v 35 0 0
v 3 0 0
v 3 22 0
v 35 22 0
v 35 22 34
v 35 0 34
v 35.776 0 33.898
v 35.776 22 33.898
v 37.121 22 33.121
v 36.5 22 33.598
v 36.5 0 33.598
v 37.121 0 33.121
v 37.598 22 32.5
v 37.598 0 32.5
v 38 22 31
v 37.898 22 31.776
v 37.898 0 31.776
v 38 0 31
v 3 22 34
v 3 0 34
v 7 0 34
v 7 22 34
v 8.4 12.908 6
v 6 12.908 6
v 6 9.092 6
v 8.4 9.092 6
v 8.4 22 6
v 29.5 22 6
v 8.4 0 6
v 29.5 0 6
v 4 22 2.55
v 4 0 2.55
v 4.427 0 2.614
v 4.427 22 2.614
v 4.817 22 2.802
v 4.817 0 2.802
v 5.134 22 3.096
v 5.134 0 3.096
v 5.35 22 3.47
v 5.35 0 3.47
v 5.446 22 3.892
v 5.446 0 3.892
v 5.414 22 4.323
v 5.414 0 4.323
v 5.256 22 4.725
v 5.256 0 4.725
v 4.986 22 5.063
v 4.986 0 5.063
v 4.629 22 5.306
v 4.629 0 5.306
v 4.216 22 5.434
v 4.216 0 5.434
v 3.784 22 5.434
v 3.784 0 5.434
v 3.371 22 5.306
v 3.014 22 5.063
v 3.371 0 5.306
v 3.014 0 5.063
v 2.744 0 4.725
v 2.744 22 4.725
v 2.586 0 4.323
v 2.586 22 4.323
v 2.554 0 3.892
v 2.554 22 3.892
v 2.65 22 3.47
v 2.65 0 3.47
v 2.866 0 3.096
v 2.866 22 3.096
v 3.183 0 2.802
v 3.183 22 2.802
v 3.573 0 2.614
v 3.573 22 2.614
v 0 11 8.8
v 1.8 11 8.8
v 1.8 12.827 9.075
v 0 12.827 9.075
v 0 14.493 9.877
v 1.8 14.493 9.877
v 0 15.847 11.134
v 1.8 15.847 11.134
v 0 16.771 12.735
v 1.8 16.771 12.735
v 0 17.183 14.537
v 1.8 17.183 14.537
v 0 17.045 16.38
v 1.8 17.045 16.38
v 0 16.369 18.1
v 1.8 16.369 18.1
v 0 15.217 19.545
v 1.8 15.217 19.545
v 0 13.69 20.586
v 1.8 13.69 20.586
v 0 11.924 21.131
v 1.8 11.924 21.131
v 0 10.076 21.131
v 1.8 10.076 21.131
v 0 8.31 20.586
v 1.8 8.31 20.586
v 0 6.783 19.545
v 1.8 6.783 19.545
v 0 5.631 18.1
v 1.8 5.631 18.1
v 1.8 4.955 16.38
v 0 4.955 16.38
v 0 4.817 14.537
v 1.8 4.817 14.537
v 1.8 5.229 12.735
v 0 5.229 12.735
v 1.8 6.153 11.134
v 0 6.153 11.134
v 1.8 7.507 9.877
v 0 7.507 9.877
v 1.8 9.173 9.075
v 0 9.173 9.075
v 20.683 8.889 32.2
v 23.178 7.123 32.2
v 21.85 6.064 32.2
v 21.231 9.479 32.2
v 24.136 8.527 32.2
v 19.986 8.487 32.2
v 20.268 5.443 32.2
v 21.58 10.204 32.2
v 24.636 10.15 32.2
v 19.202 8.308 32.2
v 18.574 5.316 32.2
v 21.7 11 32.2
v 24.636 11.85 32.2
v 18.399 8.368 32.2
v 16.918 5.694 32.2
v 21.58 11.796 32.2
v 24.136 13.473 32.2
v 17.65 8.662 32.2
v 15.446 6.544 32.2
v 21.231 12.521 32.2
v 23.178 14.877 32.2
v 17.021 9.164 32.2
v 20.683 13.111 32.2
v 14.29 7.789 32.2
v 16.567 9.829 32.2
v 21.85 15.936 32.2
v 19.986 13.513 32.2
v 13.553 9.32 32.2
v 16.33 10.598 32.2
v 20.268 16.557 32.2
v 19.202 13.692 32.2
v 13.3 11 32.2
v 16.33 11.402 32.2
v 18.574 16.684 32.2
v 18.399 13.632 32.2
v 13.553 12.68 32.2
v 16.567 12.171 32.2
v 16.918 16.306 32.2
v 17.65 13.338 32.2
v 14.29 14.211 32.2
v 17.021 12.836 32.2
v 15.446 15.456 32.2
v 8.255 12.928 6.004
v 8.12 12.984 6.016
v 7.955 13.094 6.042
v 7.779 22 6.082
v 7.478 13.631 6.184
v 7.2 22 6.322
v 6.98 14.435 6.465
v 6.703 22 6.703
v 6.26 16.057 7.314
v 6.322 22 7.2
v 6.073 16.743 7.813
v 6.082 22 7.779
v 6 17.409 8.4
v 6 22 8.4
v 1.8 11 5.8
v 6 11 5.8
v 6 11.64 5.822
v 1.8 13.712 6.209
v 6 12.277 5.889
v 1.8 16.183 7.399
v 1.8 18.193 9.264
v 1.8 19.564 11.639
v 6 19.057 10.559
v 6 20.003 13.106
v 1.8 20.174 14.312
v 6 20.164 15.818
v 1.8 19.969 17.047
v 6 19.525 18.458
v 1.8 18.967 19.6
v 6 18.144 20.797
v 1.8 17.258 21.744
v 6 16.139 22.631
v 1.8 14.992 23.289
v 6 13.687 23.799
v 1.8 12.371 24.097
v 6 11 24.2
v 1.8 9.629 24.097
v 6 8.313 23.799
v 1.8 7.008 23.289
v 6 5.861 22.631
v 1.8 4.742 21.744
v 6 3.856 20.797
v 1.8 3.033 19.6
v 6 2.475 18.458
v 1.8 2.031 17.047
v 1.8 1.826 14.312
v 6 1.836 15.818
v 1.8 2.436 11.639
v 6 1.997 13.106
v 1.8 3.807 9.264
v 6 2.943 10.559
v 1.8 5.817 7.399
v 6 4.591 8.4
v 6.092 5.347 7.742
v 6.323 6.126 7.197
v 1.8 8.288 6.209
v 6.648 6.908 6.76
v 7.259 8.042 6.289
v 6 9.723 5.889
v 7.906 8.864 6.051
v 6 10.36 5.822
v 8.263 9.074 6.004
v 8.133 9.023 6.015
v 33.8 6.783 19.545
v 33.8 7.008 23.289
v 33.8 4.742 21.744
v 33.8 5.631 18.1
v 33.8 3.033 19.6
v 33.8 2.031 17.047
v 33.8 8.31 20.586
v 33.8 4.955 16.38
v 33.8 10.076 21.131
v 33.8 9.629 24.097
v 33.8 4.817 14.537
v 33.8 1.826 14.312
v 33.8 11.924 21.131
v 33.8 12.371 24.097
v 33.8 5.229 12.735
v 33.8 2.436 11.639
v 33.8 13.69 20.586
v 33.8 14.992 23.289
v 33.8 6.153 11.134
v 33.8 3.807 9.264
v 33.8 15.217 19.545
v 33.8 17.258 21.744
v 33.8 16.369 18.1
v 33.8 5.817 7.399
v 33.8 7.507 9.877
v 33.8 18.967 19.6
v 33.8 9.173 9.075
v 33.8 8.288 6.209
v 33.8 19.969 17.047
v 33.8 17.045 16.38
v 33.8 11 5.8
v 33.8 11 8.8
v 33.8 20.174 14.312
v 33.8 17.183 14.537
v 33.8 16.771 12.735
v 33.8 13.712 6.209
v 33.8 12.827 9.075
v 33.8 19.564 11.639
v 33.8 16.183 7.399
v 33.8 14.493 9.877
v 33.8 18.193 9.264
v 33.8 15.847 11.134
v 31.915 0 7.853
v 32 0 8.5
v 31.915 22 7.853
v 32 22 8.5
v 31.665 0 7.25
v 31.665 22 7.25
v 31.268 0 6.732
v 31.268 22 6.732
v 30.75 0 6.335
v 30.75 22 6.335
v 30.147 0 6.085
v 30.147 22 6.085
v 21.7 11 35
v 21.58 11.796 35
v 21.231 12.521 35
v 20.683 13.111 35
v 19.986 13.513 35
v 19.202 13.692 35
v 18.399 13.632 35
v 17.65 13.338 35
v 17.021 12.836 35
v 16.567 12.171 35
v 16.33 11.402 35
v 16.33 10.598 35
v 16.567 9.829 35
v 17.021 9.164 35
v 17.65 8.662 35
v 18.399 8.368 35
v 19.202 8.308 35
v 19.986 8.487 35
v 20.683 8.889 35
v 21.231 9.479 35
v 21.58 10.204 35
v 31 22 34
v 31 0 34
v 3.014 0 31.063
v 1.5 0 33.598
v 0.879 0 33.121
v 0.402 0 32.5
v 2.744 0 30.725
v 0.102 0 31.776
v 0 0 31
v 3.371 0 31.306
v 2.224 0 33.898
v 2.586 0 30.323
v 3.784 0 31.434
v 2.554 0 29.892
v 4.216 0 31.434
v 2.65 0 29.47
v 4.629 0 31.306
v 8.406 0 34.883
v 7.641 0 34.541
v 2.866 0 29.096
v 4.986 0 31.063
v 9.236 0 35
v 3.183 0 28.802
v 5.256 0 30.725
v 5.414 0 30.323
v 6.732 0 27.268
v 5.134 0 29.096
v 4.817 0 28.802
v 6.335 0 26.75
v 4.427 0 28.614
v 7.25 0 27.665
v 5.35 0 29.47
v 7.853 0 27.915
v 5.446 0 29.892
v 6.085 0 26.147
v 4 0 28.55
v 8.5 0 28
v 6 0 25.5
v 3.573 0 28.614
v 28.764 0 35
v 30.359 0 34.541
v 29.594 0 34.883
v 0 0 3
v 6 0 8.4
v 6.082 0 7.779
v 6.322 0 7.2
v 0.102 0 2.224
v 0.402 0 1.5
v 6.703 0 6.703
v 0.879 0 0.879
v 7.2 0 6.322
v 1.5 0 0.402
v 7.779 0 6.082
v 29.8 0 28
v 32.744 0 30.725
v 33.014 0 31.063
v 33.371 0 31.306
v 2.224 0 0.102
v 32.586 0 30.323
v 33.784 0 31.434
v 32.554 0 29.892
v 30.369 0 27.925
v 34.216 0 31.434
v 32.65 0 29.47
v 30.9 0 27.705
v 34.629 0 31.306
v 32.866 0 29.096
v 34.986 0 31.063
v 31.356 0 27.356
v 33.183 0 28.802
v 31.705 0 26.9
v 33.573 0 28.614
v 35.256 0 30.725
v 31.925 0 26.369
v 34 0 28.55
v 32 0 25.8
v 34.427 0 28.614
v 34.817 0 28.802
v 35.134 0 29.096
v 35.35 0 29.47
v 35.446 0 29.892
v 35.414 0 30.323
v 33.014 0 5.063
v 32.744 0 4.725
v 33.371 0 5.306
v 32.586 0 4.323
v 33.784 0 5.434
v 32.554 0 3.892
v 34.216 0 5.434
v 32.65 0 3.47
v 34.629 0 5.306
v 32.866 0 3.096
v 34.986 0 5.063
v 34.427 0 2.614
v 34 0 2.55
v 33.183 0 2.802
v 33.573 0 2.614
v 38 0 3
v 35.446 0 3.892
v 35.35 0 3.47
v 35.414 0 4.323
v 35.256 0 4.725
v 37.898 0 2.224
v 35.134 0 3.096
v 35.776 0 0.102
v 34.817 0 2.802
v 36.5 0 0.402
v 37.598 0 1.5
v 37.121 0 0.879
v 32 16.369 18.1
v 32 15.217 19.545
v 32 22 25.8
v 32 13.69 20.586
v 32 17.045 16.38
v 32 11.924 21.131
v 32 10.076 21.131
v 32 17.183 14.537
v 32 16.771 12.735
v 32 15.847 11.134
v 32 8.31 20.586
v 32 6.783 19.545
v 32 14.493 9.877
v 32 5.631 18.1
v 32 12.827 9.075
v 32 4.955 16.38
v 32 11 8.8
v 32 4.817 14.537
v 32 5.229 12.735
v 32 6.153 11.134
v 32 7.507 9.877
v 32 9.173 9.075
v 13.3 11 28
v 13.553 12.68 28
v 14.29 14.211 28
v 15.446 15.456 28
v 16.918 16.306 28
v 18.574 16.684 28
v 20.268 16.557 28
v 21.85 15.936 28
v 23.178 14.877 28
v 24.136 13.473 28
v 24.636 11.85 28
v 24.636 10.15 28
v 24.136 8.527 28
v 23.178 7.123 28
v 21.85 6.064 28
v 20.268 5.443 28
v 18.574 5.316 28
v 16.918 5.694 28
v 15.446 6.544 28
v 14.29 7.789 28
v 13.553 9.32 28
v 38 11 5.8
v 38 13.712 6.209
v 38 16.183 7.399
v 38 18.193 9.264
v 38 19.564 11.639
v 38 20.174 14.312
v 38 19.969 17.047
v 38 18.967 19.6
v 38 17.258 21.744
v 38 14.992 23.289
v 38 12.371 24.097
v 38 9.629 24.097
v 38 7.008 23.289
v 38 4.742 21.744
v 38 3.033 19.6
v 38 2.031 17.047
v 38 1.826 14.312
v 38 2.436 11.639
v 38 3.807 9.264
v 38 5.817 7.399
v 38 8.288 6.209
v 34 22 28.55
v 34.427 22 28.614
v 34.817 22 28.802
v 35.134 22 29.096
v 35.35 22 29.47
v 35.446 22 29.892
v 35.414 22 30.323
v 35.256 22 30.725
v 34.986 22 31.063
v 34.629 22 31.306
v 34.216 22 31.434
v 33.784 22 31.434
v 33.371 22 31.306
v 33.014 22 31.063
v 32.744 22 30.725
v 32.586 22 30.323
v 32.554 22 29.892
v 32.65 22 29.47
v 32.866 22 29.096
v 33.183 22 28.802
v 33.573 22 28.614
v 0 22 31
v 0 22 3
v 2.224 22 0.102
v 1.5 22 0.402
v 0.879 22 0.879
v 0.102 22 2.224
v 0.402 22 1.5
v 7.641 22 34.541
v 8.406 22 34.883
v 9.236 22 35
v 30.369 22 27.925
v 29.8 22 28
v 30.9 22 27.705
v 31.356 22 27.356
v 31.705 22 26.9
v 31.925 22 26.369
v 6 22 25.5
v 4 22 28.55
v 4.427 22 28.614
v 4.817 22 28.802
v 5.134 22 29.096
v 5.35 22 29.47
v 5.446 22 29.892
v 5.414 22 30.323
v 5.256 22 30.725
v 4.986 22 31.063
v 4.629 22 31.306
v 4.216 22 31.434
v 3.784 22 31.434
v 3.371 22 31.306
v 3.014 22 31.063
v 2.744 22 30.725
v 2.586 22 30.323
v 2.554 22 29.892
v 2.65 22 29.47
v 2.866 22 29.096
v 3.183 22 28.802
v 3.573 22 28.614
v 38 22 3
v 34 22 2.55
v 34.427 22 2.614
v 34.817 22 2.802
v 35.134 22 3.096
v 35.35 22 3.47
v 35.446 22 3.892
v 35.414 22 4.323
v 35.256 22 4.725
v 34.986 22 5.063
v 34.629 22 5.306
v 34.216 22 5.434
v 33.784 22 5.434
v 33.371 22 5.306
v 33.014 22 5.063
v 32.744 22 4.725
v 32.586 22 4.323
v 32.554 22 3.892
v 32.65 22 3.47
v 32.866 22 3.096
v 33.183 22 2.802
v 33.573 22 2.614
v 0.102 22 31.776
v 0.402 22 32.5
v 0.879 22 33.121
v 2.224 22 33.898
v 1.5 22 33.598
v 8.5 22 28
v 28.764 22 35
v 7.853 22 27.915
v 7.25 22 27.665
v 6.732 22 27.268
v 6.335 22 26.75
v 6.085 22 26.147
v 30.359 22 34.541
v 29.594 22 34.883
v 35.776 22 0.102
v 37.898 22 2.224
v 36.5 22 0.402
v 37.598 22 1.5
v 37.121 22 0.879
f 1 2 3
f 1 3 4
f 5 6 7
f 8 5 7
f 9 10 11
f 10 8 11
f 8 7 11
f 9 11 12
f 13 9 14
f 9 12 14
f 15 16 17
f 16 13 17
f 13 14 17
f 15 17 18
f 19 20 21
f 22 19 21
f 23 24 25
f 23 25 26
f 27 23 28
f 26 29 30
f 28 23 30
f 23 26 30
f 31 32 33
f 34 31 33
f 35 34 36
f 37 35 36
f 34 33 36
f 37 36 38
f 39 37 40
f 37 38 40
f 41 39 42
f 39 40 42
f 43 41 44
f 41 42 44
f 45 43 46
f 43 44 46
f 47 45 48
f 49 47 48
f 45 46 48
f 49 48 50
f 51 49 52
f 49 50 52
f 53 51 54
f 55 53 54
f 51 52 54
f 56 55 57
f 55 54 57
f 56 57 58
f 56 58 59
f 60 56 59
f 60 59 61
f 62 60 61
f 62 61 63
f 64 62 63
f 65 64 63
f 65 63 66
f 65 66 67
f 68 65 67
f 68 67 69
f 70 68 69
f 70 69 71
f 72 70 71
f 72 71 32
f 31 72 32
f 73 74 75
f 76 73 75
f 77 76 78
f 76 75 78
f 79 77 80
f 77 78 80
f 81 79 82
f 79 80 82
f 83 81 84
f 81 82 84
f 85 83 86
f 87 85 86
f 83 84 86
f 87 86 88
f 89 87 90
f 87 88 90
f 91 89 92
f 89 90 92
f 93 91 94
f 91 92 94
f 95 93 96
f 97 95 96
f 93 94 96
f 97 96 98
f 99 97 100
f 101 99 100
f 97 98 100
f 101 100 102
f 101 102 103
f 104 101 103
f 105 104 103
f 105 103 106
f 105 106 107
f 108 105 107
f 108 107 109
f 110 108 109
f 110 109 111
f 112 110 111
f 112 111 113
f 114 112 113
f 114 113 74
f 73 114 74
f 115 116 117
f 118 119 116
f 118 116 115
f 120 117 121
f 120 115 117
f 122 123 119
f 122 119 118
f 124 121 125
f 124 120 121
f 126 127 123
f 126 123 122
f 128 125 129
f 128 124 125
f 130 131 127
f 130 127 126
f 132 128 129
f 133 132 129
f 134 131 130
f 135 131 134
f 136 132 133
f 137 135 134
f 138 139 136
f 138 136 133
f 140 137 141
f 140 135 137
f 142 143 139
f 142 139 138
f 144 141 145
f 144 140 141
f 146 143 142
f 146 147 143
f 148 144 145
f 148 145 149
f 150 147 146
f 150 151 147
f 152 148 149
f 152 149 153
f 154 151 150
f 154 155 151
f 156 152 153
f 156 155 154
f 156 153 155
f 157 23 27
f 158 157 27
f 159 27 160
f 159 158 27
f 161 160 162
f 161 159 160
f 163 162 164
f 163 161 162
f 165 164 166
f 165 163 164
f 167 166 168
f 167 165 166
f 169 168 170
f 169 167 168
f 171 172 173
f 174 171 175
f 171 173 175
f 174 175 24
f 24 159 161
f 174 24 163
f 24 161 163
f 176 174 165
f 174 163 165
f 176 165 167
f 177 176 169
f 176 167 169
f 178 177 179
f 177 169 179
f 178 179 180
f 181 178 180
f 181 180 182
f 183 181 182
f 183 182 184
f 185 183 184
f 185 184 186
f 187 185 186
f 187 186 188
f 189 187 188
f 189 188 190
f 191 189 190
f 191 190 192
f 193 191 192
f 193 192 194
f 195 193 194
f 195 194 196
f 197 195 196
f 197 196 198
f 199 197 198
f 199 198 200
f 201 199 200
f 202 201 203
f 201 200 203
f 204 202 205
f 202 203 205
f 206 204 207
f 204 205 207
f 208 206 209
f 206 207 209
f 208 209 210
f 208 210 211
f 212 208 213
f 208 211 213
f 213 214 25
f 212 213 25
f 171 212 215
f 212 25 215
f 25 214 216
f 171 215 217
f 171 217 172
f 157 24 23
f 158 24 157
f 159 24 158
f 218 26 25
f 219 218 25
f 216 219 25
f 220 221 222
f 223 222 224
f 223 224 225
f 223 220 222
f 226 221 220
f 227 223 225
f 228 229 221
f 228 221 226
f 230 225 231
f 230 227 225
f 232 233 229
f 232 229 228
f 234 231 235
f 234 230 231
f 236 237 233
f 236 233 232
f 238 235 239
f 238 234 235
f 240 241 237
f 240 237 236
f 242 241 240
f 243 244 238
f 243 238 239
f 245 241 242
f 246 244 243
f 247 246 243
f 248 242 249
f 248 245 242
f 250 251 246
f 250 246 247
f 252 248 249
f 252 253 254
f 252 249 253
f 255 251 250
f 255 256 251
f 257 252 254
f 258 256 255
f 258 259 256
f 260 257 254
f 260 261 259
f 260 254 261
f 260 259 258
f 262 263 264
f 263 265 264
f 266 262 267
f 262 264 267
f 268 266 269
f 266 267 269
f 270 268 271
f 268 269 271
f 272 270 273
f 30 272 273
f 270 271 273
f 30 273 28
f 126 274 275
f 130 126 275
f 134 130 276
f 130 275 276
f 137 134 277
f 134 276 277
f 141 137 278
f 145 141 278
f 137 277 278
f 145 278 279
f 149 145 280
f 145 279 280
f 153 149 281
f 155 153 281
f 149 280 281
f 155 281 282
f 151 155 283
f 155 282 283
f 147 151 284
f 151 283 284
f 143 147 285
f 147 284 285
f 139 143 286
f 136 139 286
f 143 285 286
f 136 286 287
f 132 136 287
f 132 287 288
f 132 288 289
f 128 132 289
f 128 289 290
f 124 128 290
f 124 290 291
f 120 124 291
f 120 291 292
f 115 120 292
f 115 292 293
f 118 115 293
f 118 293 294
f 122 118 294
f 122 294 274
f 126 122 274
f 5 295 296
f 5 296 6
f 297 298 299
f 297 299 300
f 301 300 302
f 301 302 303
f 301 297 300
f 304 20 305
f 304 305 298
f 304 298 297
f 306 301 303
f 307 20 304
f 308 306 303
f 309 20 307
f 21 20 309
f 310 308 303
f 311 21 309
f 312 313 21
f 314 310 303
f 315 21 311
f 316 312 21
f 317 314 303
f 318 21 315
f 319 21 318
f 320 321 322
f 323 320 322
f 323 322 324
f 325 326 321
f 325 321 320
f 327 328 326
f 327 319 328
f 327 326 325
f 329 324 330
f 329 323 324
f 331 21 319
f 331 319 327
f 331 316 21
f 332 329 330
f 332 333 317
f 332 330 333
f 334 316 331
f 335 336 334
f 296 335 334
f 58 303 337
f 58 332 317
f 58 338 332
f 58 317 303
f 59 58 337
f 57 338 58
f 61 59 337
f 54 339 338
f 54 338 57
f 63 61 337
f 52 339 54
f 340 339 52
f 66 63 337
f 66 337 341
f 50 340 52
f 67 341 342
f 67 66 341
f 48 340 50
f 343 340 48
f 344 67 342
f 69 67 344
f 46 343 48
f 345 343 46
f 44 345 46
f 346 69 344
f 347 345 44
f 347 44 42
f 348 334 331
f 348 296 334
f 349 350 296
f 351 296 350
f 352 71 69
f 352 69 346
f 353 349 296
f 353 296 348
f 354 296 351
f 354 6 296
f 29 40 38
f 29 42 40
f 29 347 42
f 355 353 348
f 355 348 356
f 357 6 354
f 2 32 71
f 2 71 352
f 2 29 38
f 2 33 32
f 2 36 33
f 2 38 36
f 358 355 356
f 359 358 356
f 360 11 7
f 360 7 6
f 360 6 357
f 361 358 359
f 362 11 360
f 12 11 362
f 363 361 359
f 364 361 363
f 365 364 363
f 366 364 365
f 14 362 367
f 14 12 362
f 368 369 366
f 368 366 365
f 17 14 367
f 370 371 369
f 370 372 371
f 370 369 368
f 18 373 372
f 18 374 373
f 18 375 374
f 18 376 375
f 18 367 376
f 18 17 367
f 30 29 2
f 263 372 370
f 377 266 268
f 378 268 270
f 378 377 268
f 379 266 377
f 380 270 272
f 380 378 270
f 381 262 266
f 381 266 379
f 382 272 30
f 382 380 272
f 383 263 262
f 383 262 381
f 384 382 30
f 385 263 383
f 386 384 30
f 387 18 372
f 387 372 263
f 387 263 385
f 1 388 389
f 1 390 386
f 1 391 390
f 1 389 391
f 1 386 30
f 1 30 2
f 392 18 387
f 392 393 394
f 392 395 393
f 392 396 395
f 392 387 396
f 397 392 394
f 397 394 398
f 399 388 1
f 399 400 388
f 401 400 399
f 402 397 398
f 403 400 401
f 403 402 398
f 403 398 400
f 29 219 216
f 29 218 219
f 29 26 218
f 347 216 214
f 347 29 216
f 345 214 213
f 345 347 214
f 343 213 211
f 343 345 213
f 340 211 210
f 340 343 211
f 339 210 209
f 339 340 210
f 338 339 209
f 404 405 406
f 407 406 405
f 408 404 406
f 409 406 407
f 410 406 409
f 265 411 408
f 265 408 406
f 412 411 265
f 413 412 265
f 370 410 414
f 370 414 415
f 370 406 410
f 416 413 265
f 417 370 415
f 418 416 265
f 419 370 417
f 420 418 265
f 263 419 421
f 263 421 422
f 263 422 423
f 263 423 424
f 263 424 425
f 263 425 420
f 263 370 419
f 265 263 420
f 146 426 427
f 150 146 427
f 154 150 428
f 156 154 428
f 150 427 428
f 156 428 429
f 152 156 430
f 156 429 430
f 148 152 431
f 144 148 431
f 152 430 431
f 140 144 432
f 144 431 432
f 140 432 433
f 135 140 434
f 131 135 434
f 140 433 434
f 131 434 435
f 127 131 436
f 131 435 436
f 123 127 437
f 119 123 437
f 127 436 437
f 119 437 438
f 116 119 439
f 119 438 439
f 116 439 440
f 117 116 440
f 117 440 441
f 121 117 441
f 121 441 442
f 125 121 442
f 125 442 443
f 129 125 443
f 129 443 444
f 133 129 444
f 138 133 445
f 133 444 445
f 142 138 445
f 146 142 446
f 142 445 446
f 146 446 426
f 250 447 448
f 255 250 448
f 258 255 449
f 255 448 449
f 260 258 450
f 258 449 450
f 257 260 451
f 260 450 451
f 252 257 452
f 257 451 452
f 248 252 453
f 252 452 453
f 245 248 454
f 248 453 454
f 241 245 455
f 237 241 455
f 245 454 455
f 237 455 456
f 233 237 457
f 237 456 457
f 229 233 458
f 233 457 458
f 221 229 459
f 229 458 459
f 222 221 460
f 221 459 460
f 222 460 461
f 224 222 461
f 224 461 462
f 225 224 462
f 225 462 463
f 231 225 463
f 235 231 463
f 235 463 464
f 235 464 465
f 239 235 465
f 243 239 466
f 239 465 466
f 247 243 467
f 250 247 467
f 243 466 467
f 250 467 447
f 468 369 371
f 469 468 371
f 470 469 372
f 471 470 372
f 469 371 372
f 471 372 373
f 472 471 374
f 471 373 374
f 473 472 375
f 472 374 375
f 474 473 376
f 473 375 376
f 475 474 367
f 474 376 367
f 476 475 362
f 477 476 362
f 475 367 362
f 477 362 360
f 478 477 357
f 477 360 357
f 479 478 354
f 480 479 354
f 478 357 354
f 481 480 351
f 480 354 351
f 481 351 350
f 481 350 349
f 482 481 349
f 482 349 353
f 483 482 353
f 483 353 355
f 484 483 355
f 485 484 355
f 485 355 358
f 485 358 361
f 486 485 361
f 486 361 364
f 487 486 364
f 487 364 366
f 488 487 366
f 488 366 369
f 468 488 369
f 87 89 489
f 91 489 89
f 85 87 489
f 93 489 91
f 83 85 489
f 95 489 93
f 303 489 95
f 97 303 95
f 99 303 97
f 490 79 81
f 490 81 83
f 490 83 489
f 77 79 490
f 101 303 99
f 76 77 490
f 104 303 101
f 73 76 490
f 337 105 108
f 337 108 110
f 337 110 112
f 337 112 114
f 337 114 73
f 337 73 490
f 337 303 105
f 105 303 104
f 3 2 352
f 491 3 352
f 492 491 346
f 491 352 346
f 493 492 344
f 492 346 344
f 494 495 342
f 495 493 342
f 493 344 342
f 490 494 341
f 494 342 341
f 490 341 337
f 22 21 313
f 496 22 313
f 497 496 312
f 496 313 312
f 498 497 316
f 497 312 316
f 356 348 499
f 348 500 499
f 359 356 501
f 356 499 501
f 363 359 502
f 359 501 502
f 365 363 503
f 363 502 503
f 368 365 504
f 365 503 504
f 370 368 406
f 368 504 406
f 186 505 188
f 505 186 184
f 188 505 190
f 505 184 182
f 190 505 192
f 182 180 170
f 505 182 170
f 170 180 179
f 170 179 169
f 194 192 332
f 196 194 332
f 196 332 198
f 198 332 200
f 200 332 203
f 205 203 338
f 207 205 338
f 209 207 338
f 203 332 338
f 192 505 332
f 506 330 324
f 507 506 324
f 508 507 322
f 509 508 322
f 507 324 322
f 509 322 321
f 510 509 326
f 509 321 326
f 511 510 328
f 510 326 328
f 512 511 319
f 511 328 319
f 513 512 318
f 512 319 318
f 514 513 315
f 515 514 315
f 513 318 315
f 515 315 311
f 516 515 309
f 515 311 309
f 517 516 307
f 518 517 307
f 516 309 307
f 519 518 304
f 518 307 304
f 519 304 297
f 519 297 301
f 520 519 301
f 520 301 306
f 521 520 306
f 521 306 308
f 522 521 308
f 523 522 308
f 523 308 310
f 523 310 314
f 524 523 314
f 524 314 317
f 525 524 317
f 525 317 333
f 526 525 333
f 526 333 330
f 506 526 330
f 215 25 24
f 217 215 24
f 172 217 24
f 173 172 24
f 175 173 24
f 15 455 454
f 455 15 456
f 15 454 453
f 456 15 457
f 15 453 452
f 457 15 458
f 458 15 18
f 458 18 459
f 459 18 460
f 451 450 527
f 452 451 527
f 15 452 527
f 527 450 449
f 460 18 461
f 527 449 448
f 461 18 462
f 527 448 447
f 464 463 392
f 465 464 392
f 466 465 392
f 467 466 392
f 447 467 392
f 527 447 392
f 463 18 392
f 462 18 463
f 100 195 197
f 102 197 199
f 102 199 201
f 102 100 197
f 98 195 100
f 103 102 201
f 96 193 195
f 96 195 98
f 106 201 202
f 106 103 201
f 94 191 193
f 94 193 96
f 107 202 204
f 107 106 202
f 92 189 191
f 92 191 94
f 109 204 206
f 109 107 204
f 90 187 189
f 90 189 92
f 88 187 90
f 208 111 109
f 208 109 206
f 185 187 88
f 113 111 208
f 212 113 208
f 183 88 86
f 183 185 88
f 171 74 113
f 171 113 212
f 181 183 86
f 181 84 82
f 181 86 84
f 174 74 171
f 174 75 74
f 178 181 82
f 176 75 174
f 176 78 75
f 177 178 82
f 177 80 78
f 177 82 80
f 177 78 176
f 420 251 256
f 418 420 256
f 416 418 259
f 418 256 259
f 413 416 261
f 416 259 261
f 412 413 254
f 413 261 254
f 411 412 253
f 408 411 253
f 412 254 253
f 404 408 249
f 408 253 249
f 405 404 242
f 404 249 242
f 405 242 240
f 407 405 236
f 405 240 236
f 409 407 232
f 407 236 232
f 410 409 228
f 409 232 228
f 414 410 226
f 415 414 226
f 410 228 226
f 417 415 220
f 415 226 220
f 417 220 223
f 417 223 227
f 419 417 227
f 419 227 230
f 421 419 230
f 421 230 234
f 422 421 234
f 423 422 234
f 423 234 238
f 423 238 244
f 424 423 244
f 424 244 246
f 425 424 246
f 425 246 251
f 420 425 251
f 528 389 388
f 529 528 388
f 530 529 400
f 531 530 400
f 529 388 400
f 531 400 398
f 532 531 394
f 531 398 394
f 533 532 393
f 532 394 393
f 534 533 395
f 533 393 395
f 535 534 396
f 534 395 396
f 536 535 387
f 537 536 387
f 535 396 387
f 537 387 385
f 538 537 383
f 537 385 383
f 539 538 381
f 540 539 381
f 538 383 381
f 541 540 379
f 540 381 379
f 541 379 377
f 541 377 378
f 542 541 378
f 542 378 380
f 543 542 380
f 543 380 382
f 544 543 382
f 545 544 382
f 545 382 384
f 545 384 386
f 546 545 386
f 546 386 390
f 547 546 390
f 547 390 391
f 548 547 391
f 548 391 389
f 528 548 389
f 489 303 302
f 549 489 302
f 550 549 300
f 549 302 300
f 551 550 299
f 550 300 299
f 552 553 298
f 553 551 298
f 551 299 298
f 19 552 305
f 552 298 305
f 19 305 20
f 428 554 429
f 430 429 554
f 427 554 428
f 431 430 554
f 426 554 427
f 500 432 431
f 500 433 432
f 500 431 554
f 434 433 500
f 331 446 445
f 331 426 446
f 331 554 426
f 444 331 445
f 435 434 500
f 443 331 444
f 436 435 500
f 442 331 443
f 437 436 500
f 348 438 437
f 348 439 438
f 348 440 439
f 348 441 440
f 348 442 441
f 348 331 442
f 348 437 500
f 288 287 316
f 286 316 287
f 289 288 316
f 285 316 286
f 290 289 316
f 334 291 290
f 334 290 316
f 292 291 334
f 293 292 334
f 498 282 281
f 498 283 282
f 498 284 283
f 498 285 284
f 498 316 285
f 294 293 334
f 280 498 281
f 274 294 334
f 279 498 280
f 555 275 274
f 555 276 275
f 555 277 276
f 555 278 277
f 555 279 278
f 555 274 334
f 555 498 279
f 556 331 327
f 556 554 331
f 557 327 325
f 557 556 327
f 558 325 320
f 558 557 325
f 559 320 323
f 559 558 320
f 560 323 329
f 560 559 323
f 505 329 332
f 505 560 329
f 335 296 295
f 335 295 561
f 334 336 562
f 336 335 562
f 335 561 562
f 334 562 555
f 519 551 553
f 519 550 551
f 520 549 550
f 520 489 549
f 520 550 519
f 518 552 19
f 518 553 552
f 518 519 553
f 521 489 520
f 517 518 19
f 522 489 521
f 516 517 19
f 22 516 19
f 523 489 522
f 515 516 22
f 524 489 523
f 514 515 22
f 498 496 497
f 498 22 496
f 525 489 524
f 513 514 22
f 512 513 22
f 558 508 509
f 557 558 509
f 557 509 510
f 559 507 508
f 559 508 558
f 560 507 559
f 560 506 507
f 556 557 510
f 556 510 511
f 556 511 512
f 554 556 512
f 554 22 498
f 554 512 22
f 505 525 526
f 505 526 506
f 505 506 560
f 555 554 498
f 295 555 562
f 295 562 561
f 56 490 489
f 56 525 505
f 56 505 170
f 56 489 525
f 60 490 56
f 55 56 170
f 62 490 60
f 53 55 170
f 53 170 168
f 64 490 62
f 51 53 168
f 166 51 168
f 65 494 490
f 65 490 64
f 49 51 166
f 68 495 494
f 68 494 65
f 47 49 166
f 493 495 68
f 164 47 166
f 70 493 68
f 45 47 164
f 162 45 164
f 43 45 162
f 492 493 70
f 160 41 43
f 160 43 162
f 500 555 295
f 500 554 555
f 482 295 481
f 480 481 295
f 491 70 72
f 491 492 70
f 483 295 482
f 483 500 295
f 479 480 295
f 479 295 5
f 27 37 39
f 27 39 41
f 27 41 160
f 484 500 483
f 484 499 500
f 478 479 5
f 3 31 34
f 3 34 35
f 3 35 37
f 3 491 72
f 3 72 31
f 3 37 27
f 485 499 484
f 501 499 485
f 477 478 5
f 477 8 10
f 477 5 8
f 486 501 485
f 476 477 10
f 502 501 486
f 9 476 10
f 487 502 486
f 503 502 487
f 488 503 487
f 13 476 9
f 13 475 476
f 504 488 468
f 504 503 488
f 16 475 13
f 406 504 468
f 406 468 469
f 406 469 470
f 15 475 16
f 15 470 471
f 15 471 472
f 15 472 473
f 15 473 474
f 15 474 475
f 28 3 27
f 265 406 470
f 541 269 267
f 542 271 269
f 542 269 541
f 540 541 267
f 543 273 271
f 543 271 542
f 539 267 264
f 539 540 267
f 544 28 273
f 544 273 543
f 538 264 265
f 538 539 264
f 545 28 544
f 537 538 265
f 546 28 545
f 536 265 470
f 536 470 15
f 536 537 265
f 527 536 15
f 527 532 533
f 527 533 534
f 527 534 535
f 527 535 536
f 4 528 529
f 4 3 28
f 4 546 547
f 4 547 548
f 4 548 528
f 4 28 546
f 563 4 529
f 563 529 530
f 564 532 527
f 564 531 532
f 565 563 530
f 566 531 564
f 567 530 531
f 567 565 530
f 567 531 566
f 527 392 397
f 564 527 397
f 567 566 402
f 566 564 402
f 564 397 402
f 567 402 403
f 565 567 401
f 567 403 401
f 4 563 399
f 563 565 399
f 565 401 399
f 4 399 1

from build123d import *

# Parameters (mm, degrees)
SKETCH3_W           = 38
SKETCH3_H           = 34
SKETCH3_W_2         = 26
SKETCH3_H_2         = 22
BOSS_EXTRUDE1_DEPTH = 22
SKETCH4_W           = 24
SKETCH4_H           = 22
BOSS_EXTRUDE2_DEPTH = 1
SKETCH5_R           = 2.7
CUT_EXTRUDE1_DEPTH  = 12
SKETCH7_R           = 5.7
CUT_EXTRUDE3_DEPTH  = 4.2
SKETCH8_R           = 6.2
CUT_EXTRUDE4_DEPTH  = 57.151580565
SKETCH9_R           = 9.2
CUT_EXTRUDE5_DEPTH  = 4.2
SKETCH10_R          = 9.2
CUT_EXTRUDE6_DEPTH  = 4.2
SKETCH15_R          = 1.45
CUT_EXTRUDE7_DEPTH  = 57.151580565
FILLET1_R           = 3
FILLET3_R           = 2.5
FILLET4_R           = 2.2
FILLET5_R           = 2.4


with BuildPart() as part:
    # Sketch3 → Boss-Extrude1 (new body)
    with BuildSketch(Plane(origin=(0, 0, 0), x_dir=(1, 0, 0), z_dir=(0, 1, 0))):
        with Locations((19, -17)):
            Rectangle(SKETCH3_W, SKETCH3_H)
        with Locations((19, -17)):
            Rectangle(SKETCH3_W_2, SKETCH3_H_2, mode=Mode.SUBTRACT)
    extrude(amount=BOSS_EXTRUDE1_DEPTH)

    # Sketch4 → Boss-Extrude2 (add)
    with BuildSketch(Plane.XY.offset(34)):
        with Locations((19, 11)):
            Rectangle(SKETCH4_W, SKETCH4_H)
    extrude(amount=BOSS_EXTRUDE2_DEPTH)

    # Sketch5 → Cut-Extrude1 (cut)
    with BuildSketch(Plane.XY.offset(35)):
        with Locations((19, 11)):
            Circle(SKETCH5_R)
    extrude(amount=-CUT_EXTRUDE1_DEPTH, mode=Mode.SUBTRACT)

    # Sketch7 → Cut-Extrude3 (cut)
    with BuildSketch(Plane(origin=(0, 0, 28), x_dir=(-1, 0, 0), z_dir=(0, 0, -1))):
        with Locations((-19, 11)):
            Circle(SKETCH7_R)
    extrude(amount=-CUT_EXTRUDE3_DEPTH, mode=Mode.SUBTRACT)

    # Sketch8 → Cut-Extrude4 (cut, through all)
    with BuildSketch(Plane(origin=(38, 0, 0), x_dir=(0, 0, -1), z_dir=(1, 0, 0))):
        with Locations((-15, 11)):
            Circle(SKETCH8_R)
    extrude(amount=-CUT_EXTRUDE4_DEPTH, mode=Mode.SUBTRACT)

    # Sketch9 → Cut-Extrude5 (cut)
    with BuildSketch(Plane(origin=(6, 0, 0), x_dir=(0, 0, -1), z_dir=(1, 0, 0))):
        with Locations((-15, 11)):
            Circle(SKETCH9_R)
    extrude(amount=-CUT_EXTRUDE5_DEPTH, mode=Mode.SUBTRACT)

    # Sketch10 → Cut-Extrude6 (cut)
    with BuildSketch(Plane(origin=(38, 0, 0), x_dir=(0, 0, -1), z_dir=(1, 0, 0))):
        with Locations((-15, 11)):
            Circle(SKETCH10_R)
    extrude(amount=-CUT_EXTRUDE6_DEPTH, mode=Mode.SUBTRACT)

    # Sketch15 → Cut-Extrude7 (cut, through all)
    with BuildSketch(Plane(origin=(0, 0, 0), x_dir=(-1, 0, 0), z_dir=(0, -1, 0))):
        with Locations(Location((-4, -30, 0), (0, 0, 90))):
            Circle(SKETCH15_R)
        with Locations(Location((-34, -30, 0), (0, 0, 90))):
            Circle(SKETCH15_R)
        with Locations(Location((-34, -4, 0), (0, 0, 90))):
            Circle(SKETCH15_R)
        with Locations(Location((-4, -4, 0), (0, 0, 90))):
            Circle(SKETCH15_R)
    extrude(amount=-CUT_EXTRUDE7_DEPTH, mode=Mode.SUBTRACT)

    # Fillet1
    # the kernel refuses this fillet: 3 mm, written as the material it takes off along each edge
    with BuildSketch(Plane(origin=(38, -7.5, 0), x_dir=(-1, 0, 0), z_dir=(0, 1, 0)), Plane(origin=(38, -7.5, 34), x_dir=(0, 0, -1), z_dir=(0, 1, 0))) as fillet1_piece_1:
        with BuildLine():
            CenterArc((FILLET1_R, FILLET1_R), FILLET1_R, 180, 90)
            Line((0, FILLET1_R), (-FILLET1_R * 0.02, FILLET1_R))
            Line((-FILLET1_R * 0.02, FILLET1_R), (-FILLET1_R * 0.02, -FILLET1_R * 0.02))
            Line((-FILLET1_R * 0.02, -FILLET1_R * 0.02), (FILLET1_R, -FILLET1_R * 0.02))
            Line((FILLET1_R, -FILLET1_R * 0.02), (FILLET1_R, 0))
        make_face()
    extrude(amount=37, mode=Mode.SUBTRACT)
    with BuildSketch(Plane(origin=(7, -5.590169944, 35), x_dir=(0, 0, -1), z_dir=(0, 1, 0)), Plane(origin=(31, 27.590169944, 35), x_dir=(0, 0, -1), z_dir=(0, -1, 0))) as fillet1_piece_2:
        with BuildLine():
            CenterArc((3, -2.236067977), FILLET1_R, 131.810314896, 48.189685104)
            Line((0, -2.236067977), (-0.06, -2.236067977))
            Line((-0.06, -2.236067977), (-0.06, 0))
            Line((-0.06, 0), (0, 0.06))
            ThreePointArc((0, 0.06), (0.5, 0.06), (0.96, 0.04472136))
            Line((0.96, 0.04472136), (1, 0))
        make_face()
    extrude(amount=33.180339887, mode=Mode.SUBTRACT)
    with BuildSketch(Plane(origin=(0, -7.5, 34), x_dir=(0, 0, -1), z_dir=(0, 1, 0)), Plane(origin=(0, -7.5, 0), x_dir=(1, 0, 0), z_dir=(0, 1, 0))) as fillet1_piece_3:
        with BuildLine():
            CenterArc((FILLET1_R, -FILLET1_R), FILLET1_R, 90, 90)
            Line((0, -FILLET1_R), (-FILLET1_R * 0.02, -FILLET1_R))
            Line((-FILLET1_R * 0.02, -FILLET1_R), (-FILLET1_R * 0.02, FILLET1_R * 0.02))
            Line((-FILLET1_R * 0.02, FILLET1_R * 0.02), (FILLET1_R, FILLET1_R * 0.02))
            Line((FILLET1_R, FILLET1_R * 0.02), (FILLET1_R, 0))
        make_face()
    extrude(amount=37, mode=Mode.SUBTRACT)

    # Fillet3
    fillet3_edges = [part.edges().sort_by_distance(p)[0] for p in [
        (6, 11, 28),
        (32, 11, 6),
    ]]
    fillet(fillet3_edges, radius=FILLET3_R)

    # Fillet4
    fillet4_edges = [part.edges().sort_by_distance(p)[0] for p in [
        (32, 11, 28),
    ]]
    fillet(fillet4_edges, radius=FILLET4_R)

    # Fillet5
    # the kernel refuses this fillet: 2.4 mm, written as the material it adds along each edge
    with BuildSketch(Plane(origin=(6, 6.907878403, 6), x_dir=(0, 0, 1), z_dir=(0, 1, 0))) as fillet5_piece_1_section:
        with BuildLine():
            CenterArc((FILLET5_R, FILLET5_R), FILLET5_R, 180, 90)
            Line((0, FILLET5_R), (0, 0))
            Line((0, 0), (FILLET5_R, 0))
        make_face()
    fillet5_piece_1 = extrude(amount=15.092121597, mode=Mode.PRIVATE)
    fillet5_piece_1 = fillet5_piece_1 - Plane(origin=(6.778295216, 11, 15), x_dir=(0, 0, -1), z_dir=(1, 0, 0)) * Cylinder(9.2, 40, mode=Mode.PRIVATE)
    add(fillet5_piece_1)
    with BuildSketch(Plane(origin=(6, 0, 6), x_dir=(0, 0, 1), z_dir=(0, 1, 0))) as fillet5_piece_2_section:
        with BuildLine():
            CenterArc((FILLET5_R, FILLET5_R), FILLET5_R, 180, 90)
            Line((0, FILLET5_R), (0, 0))
            Line((0, 0), (FILLET5_R, 0))
        make_face()
    fillet5_piece_2 = extrude(amount=15.092121597, mode=Mode.PRIVATE)
    fillet5_piece_2 = fillet5_piece_2 - Plane(origin=(6.572967992, 11, 15), x_dir=(0, 0, -1), z_dir=(1, 0, 0)) * Cylinder(9.2, 40, mode=Mode.PRIVATE)
    add(fillet5_piece_2)


solid = part.part
